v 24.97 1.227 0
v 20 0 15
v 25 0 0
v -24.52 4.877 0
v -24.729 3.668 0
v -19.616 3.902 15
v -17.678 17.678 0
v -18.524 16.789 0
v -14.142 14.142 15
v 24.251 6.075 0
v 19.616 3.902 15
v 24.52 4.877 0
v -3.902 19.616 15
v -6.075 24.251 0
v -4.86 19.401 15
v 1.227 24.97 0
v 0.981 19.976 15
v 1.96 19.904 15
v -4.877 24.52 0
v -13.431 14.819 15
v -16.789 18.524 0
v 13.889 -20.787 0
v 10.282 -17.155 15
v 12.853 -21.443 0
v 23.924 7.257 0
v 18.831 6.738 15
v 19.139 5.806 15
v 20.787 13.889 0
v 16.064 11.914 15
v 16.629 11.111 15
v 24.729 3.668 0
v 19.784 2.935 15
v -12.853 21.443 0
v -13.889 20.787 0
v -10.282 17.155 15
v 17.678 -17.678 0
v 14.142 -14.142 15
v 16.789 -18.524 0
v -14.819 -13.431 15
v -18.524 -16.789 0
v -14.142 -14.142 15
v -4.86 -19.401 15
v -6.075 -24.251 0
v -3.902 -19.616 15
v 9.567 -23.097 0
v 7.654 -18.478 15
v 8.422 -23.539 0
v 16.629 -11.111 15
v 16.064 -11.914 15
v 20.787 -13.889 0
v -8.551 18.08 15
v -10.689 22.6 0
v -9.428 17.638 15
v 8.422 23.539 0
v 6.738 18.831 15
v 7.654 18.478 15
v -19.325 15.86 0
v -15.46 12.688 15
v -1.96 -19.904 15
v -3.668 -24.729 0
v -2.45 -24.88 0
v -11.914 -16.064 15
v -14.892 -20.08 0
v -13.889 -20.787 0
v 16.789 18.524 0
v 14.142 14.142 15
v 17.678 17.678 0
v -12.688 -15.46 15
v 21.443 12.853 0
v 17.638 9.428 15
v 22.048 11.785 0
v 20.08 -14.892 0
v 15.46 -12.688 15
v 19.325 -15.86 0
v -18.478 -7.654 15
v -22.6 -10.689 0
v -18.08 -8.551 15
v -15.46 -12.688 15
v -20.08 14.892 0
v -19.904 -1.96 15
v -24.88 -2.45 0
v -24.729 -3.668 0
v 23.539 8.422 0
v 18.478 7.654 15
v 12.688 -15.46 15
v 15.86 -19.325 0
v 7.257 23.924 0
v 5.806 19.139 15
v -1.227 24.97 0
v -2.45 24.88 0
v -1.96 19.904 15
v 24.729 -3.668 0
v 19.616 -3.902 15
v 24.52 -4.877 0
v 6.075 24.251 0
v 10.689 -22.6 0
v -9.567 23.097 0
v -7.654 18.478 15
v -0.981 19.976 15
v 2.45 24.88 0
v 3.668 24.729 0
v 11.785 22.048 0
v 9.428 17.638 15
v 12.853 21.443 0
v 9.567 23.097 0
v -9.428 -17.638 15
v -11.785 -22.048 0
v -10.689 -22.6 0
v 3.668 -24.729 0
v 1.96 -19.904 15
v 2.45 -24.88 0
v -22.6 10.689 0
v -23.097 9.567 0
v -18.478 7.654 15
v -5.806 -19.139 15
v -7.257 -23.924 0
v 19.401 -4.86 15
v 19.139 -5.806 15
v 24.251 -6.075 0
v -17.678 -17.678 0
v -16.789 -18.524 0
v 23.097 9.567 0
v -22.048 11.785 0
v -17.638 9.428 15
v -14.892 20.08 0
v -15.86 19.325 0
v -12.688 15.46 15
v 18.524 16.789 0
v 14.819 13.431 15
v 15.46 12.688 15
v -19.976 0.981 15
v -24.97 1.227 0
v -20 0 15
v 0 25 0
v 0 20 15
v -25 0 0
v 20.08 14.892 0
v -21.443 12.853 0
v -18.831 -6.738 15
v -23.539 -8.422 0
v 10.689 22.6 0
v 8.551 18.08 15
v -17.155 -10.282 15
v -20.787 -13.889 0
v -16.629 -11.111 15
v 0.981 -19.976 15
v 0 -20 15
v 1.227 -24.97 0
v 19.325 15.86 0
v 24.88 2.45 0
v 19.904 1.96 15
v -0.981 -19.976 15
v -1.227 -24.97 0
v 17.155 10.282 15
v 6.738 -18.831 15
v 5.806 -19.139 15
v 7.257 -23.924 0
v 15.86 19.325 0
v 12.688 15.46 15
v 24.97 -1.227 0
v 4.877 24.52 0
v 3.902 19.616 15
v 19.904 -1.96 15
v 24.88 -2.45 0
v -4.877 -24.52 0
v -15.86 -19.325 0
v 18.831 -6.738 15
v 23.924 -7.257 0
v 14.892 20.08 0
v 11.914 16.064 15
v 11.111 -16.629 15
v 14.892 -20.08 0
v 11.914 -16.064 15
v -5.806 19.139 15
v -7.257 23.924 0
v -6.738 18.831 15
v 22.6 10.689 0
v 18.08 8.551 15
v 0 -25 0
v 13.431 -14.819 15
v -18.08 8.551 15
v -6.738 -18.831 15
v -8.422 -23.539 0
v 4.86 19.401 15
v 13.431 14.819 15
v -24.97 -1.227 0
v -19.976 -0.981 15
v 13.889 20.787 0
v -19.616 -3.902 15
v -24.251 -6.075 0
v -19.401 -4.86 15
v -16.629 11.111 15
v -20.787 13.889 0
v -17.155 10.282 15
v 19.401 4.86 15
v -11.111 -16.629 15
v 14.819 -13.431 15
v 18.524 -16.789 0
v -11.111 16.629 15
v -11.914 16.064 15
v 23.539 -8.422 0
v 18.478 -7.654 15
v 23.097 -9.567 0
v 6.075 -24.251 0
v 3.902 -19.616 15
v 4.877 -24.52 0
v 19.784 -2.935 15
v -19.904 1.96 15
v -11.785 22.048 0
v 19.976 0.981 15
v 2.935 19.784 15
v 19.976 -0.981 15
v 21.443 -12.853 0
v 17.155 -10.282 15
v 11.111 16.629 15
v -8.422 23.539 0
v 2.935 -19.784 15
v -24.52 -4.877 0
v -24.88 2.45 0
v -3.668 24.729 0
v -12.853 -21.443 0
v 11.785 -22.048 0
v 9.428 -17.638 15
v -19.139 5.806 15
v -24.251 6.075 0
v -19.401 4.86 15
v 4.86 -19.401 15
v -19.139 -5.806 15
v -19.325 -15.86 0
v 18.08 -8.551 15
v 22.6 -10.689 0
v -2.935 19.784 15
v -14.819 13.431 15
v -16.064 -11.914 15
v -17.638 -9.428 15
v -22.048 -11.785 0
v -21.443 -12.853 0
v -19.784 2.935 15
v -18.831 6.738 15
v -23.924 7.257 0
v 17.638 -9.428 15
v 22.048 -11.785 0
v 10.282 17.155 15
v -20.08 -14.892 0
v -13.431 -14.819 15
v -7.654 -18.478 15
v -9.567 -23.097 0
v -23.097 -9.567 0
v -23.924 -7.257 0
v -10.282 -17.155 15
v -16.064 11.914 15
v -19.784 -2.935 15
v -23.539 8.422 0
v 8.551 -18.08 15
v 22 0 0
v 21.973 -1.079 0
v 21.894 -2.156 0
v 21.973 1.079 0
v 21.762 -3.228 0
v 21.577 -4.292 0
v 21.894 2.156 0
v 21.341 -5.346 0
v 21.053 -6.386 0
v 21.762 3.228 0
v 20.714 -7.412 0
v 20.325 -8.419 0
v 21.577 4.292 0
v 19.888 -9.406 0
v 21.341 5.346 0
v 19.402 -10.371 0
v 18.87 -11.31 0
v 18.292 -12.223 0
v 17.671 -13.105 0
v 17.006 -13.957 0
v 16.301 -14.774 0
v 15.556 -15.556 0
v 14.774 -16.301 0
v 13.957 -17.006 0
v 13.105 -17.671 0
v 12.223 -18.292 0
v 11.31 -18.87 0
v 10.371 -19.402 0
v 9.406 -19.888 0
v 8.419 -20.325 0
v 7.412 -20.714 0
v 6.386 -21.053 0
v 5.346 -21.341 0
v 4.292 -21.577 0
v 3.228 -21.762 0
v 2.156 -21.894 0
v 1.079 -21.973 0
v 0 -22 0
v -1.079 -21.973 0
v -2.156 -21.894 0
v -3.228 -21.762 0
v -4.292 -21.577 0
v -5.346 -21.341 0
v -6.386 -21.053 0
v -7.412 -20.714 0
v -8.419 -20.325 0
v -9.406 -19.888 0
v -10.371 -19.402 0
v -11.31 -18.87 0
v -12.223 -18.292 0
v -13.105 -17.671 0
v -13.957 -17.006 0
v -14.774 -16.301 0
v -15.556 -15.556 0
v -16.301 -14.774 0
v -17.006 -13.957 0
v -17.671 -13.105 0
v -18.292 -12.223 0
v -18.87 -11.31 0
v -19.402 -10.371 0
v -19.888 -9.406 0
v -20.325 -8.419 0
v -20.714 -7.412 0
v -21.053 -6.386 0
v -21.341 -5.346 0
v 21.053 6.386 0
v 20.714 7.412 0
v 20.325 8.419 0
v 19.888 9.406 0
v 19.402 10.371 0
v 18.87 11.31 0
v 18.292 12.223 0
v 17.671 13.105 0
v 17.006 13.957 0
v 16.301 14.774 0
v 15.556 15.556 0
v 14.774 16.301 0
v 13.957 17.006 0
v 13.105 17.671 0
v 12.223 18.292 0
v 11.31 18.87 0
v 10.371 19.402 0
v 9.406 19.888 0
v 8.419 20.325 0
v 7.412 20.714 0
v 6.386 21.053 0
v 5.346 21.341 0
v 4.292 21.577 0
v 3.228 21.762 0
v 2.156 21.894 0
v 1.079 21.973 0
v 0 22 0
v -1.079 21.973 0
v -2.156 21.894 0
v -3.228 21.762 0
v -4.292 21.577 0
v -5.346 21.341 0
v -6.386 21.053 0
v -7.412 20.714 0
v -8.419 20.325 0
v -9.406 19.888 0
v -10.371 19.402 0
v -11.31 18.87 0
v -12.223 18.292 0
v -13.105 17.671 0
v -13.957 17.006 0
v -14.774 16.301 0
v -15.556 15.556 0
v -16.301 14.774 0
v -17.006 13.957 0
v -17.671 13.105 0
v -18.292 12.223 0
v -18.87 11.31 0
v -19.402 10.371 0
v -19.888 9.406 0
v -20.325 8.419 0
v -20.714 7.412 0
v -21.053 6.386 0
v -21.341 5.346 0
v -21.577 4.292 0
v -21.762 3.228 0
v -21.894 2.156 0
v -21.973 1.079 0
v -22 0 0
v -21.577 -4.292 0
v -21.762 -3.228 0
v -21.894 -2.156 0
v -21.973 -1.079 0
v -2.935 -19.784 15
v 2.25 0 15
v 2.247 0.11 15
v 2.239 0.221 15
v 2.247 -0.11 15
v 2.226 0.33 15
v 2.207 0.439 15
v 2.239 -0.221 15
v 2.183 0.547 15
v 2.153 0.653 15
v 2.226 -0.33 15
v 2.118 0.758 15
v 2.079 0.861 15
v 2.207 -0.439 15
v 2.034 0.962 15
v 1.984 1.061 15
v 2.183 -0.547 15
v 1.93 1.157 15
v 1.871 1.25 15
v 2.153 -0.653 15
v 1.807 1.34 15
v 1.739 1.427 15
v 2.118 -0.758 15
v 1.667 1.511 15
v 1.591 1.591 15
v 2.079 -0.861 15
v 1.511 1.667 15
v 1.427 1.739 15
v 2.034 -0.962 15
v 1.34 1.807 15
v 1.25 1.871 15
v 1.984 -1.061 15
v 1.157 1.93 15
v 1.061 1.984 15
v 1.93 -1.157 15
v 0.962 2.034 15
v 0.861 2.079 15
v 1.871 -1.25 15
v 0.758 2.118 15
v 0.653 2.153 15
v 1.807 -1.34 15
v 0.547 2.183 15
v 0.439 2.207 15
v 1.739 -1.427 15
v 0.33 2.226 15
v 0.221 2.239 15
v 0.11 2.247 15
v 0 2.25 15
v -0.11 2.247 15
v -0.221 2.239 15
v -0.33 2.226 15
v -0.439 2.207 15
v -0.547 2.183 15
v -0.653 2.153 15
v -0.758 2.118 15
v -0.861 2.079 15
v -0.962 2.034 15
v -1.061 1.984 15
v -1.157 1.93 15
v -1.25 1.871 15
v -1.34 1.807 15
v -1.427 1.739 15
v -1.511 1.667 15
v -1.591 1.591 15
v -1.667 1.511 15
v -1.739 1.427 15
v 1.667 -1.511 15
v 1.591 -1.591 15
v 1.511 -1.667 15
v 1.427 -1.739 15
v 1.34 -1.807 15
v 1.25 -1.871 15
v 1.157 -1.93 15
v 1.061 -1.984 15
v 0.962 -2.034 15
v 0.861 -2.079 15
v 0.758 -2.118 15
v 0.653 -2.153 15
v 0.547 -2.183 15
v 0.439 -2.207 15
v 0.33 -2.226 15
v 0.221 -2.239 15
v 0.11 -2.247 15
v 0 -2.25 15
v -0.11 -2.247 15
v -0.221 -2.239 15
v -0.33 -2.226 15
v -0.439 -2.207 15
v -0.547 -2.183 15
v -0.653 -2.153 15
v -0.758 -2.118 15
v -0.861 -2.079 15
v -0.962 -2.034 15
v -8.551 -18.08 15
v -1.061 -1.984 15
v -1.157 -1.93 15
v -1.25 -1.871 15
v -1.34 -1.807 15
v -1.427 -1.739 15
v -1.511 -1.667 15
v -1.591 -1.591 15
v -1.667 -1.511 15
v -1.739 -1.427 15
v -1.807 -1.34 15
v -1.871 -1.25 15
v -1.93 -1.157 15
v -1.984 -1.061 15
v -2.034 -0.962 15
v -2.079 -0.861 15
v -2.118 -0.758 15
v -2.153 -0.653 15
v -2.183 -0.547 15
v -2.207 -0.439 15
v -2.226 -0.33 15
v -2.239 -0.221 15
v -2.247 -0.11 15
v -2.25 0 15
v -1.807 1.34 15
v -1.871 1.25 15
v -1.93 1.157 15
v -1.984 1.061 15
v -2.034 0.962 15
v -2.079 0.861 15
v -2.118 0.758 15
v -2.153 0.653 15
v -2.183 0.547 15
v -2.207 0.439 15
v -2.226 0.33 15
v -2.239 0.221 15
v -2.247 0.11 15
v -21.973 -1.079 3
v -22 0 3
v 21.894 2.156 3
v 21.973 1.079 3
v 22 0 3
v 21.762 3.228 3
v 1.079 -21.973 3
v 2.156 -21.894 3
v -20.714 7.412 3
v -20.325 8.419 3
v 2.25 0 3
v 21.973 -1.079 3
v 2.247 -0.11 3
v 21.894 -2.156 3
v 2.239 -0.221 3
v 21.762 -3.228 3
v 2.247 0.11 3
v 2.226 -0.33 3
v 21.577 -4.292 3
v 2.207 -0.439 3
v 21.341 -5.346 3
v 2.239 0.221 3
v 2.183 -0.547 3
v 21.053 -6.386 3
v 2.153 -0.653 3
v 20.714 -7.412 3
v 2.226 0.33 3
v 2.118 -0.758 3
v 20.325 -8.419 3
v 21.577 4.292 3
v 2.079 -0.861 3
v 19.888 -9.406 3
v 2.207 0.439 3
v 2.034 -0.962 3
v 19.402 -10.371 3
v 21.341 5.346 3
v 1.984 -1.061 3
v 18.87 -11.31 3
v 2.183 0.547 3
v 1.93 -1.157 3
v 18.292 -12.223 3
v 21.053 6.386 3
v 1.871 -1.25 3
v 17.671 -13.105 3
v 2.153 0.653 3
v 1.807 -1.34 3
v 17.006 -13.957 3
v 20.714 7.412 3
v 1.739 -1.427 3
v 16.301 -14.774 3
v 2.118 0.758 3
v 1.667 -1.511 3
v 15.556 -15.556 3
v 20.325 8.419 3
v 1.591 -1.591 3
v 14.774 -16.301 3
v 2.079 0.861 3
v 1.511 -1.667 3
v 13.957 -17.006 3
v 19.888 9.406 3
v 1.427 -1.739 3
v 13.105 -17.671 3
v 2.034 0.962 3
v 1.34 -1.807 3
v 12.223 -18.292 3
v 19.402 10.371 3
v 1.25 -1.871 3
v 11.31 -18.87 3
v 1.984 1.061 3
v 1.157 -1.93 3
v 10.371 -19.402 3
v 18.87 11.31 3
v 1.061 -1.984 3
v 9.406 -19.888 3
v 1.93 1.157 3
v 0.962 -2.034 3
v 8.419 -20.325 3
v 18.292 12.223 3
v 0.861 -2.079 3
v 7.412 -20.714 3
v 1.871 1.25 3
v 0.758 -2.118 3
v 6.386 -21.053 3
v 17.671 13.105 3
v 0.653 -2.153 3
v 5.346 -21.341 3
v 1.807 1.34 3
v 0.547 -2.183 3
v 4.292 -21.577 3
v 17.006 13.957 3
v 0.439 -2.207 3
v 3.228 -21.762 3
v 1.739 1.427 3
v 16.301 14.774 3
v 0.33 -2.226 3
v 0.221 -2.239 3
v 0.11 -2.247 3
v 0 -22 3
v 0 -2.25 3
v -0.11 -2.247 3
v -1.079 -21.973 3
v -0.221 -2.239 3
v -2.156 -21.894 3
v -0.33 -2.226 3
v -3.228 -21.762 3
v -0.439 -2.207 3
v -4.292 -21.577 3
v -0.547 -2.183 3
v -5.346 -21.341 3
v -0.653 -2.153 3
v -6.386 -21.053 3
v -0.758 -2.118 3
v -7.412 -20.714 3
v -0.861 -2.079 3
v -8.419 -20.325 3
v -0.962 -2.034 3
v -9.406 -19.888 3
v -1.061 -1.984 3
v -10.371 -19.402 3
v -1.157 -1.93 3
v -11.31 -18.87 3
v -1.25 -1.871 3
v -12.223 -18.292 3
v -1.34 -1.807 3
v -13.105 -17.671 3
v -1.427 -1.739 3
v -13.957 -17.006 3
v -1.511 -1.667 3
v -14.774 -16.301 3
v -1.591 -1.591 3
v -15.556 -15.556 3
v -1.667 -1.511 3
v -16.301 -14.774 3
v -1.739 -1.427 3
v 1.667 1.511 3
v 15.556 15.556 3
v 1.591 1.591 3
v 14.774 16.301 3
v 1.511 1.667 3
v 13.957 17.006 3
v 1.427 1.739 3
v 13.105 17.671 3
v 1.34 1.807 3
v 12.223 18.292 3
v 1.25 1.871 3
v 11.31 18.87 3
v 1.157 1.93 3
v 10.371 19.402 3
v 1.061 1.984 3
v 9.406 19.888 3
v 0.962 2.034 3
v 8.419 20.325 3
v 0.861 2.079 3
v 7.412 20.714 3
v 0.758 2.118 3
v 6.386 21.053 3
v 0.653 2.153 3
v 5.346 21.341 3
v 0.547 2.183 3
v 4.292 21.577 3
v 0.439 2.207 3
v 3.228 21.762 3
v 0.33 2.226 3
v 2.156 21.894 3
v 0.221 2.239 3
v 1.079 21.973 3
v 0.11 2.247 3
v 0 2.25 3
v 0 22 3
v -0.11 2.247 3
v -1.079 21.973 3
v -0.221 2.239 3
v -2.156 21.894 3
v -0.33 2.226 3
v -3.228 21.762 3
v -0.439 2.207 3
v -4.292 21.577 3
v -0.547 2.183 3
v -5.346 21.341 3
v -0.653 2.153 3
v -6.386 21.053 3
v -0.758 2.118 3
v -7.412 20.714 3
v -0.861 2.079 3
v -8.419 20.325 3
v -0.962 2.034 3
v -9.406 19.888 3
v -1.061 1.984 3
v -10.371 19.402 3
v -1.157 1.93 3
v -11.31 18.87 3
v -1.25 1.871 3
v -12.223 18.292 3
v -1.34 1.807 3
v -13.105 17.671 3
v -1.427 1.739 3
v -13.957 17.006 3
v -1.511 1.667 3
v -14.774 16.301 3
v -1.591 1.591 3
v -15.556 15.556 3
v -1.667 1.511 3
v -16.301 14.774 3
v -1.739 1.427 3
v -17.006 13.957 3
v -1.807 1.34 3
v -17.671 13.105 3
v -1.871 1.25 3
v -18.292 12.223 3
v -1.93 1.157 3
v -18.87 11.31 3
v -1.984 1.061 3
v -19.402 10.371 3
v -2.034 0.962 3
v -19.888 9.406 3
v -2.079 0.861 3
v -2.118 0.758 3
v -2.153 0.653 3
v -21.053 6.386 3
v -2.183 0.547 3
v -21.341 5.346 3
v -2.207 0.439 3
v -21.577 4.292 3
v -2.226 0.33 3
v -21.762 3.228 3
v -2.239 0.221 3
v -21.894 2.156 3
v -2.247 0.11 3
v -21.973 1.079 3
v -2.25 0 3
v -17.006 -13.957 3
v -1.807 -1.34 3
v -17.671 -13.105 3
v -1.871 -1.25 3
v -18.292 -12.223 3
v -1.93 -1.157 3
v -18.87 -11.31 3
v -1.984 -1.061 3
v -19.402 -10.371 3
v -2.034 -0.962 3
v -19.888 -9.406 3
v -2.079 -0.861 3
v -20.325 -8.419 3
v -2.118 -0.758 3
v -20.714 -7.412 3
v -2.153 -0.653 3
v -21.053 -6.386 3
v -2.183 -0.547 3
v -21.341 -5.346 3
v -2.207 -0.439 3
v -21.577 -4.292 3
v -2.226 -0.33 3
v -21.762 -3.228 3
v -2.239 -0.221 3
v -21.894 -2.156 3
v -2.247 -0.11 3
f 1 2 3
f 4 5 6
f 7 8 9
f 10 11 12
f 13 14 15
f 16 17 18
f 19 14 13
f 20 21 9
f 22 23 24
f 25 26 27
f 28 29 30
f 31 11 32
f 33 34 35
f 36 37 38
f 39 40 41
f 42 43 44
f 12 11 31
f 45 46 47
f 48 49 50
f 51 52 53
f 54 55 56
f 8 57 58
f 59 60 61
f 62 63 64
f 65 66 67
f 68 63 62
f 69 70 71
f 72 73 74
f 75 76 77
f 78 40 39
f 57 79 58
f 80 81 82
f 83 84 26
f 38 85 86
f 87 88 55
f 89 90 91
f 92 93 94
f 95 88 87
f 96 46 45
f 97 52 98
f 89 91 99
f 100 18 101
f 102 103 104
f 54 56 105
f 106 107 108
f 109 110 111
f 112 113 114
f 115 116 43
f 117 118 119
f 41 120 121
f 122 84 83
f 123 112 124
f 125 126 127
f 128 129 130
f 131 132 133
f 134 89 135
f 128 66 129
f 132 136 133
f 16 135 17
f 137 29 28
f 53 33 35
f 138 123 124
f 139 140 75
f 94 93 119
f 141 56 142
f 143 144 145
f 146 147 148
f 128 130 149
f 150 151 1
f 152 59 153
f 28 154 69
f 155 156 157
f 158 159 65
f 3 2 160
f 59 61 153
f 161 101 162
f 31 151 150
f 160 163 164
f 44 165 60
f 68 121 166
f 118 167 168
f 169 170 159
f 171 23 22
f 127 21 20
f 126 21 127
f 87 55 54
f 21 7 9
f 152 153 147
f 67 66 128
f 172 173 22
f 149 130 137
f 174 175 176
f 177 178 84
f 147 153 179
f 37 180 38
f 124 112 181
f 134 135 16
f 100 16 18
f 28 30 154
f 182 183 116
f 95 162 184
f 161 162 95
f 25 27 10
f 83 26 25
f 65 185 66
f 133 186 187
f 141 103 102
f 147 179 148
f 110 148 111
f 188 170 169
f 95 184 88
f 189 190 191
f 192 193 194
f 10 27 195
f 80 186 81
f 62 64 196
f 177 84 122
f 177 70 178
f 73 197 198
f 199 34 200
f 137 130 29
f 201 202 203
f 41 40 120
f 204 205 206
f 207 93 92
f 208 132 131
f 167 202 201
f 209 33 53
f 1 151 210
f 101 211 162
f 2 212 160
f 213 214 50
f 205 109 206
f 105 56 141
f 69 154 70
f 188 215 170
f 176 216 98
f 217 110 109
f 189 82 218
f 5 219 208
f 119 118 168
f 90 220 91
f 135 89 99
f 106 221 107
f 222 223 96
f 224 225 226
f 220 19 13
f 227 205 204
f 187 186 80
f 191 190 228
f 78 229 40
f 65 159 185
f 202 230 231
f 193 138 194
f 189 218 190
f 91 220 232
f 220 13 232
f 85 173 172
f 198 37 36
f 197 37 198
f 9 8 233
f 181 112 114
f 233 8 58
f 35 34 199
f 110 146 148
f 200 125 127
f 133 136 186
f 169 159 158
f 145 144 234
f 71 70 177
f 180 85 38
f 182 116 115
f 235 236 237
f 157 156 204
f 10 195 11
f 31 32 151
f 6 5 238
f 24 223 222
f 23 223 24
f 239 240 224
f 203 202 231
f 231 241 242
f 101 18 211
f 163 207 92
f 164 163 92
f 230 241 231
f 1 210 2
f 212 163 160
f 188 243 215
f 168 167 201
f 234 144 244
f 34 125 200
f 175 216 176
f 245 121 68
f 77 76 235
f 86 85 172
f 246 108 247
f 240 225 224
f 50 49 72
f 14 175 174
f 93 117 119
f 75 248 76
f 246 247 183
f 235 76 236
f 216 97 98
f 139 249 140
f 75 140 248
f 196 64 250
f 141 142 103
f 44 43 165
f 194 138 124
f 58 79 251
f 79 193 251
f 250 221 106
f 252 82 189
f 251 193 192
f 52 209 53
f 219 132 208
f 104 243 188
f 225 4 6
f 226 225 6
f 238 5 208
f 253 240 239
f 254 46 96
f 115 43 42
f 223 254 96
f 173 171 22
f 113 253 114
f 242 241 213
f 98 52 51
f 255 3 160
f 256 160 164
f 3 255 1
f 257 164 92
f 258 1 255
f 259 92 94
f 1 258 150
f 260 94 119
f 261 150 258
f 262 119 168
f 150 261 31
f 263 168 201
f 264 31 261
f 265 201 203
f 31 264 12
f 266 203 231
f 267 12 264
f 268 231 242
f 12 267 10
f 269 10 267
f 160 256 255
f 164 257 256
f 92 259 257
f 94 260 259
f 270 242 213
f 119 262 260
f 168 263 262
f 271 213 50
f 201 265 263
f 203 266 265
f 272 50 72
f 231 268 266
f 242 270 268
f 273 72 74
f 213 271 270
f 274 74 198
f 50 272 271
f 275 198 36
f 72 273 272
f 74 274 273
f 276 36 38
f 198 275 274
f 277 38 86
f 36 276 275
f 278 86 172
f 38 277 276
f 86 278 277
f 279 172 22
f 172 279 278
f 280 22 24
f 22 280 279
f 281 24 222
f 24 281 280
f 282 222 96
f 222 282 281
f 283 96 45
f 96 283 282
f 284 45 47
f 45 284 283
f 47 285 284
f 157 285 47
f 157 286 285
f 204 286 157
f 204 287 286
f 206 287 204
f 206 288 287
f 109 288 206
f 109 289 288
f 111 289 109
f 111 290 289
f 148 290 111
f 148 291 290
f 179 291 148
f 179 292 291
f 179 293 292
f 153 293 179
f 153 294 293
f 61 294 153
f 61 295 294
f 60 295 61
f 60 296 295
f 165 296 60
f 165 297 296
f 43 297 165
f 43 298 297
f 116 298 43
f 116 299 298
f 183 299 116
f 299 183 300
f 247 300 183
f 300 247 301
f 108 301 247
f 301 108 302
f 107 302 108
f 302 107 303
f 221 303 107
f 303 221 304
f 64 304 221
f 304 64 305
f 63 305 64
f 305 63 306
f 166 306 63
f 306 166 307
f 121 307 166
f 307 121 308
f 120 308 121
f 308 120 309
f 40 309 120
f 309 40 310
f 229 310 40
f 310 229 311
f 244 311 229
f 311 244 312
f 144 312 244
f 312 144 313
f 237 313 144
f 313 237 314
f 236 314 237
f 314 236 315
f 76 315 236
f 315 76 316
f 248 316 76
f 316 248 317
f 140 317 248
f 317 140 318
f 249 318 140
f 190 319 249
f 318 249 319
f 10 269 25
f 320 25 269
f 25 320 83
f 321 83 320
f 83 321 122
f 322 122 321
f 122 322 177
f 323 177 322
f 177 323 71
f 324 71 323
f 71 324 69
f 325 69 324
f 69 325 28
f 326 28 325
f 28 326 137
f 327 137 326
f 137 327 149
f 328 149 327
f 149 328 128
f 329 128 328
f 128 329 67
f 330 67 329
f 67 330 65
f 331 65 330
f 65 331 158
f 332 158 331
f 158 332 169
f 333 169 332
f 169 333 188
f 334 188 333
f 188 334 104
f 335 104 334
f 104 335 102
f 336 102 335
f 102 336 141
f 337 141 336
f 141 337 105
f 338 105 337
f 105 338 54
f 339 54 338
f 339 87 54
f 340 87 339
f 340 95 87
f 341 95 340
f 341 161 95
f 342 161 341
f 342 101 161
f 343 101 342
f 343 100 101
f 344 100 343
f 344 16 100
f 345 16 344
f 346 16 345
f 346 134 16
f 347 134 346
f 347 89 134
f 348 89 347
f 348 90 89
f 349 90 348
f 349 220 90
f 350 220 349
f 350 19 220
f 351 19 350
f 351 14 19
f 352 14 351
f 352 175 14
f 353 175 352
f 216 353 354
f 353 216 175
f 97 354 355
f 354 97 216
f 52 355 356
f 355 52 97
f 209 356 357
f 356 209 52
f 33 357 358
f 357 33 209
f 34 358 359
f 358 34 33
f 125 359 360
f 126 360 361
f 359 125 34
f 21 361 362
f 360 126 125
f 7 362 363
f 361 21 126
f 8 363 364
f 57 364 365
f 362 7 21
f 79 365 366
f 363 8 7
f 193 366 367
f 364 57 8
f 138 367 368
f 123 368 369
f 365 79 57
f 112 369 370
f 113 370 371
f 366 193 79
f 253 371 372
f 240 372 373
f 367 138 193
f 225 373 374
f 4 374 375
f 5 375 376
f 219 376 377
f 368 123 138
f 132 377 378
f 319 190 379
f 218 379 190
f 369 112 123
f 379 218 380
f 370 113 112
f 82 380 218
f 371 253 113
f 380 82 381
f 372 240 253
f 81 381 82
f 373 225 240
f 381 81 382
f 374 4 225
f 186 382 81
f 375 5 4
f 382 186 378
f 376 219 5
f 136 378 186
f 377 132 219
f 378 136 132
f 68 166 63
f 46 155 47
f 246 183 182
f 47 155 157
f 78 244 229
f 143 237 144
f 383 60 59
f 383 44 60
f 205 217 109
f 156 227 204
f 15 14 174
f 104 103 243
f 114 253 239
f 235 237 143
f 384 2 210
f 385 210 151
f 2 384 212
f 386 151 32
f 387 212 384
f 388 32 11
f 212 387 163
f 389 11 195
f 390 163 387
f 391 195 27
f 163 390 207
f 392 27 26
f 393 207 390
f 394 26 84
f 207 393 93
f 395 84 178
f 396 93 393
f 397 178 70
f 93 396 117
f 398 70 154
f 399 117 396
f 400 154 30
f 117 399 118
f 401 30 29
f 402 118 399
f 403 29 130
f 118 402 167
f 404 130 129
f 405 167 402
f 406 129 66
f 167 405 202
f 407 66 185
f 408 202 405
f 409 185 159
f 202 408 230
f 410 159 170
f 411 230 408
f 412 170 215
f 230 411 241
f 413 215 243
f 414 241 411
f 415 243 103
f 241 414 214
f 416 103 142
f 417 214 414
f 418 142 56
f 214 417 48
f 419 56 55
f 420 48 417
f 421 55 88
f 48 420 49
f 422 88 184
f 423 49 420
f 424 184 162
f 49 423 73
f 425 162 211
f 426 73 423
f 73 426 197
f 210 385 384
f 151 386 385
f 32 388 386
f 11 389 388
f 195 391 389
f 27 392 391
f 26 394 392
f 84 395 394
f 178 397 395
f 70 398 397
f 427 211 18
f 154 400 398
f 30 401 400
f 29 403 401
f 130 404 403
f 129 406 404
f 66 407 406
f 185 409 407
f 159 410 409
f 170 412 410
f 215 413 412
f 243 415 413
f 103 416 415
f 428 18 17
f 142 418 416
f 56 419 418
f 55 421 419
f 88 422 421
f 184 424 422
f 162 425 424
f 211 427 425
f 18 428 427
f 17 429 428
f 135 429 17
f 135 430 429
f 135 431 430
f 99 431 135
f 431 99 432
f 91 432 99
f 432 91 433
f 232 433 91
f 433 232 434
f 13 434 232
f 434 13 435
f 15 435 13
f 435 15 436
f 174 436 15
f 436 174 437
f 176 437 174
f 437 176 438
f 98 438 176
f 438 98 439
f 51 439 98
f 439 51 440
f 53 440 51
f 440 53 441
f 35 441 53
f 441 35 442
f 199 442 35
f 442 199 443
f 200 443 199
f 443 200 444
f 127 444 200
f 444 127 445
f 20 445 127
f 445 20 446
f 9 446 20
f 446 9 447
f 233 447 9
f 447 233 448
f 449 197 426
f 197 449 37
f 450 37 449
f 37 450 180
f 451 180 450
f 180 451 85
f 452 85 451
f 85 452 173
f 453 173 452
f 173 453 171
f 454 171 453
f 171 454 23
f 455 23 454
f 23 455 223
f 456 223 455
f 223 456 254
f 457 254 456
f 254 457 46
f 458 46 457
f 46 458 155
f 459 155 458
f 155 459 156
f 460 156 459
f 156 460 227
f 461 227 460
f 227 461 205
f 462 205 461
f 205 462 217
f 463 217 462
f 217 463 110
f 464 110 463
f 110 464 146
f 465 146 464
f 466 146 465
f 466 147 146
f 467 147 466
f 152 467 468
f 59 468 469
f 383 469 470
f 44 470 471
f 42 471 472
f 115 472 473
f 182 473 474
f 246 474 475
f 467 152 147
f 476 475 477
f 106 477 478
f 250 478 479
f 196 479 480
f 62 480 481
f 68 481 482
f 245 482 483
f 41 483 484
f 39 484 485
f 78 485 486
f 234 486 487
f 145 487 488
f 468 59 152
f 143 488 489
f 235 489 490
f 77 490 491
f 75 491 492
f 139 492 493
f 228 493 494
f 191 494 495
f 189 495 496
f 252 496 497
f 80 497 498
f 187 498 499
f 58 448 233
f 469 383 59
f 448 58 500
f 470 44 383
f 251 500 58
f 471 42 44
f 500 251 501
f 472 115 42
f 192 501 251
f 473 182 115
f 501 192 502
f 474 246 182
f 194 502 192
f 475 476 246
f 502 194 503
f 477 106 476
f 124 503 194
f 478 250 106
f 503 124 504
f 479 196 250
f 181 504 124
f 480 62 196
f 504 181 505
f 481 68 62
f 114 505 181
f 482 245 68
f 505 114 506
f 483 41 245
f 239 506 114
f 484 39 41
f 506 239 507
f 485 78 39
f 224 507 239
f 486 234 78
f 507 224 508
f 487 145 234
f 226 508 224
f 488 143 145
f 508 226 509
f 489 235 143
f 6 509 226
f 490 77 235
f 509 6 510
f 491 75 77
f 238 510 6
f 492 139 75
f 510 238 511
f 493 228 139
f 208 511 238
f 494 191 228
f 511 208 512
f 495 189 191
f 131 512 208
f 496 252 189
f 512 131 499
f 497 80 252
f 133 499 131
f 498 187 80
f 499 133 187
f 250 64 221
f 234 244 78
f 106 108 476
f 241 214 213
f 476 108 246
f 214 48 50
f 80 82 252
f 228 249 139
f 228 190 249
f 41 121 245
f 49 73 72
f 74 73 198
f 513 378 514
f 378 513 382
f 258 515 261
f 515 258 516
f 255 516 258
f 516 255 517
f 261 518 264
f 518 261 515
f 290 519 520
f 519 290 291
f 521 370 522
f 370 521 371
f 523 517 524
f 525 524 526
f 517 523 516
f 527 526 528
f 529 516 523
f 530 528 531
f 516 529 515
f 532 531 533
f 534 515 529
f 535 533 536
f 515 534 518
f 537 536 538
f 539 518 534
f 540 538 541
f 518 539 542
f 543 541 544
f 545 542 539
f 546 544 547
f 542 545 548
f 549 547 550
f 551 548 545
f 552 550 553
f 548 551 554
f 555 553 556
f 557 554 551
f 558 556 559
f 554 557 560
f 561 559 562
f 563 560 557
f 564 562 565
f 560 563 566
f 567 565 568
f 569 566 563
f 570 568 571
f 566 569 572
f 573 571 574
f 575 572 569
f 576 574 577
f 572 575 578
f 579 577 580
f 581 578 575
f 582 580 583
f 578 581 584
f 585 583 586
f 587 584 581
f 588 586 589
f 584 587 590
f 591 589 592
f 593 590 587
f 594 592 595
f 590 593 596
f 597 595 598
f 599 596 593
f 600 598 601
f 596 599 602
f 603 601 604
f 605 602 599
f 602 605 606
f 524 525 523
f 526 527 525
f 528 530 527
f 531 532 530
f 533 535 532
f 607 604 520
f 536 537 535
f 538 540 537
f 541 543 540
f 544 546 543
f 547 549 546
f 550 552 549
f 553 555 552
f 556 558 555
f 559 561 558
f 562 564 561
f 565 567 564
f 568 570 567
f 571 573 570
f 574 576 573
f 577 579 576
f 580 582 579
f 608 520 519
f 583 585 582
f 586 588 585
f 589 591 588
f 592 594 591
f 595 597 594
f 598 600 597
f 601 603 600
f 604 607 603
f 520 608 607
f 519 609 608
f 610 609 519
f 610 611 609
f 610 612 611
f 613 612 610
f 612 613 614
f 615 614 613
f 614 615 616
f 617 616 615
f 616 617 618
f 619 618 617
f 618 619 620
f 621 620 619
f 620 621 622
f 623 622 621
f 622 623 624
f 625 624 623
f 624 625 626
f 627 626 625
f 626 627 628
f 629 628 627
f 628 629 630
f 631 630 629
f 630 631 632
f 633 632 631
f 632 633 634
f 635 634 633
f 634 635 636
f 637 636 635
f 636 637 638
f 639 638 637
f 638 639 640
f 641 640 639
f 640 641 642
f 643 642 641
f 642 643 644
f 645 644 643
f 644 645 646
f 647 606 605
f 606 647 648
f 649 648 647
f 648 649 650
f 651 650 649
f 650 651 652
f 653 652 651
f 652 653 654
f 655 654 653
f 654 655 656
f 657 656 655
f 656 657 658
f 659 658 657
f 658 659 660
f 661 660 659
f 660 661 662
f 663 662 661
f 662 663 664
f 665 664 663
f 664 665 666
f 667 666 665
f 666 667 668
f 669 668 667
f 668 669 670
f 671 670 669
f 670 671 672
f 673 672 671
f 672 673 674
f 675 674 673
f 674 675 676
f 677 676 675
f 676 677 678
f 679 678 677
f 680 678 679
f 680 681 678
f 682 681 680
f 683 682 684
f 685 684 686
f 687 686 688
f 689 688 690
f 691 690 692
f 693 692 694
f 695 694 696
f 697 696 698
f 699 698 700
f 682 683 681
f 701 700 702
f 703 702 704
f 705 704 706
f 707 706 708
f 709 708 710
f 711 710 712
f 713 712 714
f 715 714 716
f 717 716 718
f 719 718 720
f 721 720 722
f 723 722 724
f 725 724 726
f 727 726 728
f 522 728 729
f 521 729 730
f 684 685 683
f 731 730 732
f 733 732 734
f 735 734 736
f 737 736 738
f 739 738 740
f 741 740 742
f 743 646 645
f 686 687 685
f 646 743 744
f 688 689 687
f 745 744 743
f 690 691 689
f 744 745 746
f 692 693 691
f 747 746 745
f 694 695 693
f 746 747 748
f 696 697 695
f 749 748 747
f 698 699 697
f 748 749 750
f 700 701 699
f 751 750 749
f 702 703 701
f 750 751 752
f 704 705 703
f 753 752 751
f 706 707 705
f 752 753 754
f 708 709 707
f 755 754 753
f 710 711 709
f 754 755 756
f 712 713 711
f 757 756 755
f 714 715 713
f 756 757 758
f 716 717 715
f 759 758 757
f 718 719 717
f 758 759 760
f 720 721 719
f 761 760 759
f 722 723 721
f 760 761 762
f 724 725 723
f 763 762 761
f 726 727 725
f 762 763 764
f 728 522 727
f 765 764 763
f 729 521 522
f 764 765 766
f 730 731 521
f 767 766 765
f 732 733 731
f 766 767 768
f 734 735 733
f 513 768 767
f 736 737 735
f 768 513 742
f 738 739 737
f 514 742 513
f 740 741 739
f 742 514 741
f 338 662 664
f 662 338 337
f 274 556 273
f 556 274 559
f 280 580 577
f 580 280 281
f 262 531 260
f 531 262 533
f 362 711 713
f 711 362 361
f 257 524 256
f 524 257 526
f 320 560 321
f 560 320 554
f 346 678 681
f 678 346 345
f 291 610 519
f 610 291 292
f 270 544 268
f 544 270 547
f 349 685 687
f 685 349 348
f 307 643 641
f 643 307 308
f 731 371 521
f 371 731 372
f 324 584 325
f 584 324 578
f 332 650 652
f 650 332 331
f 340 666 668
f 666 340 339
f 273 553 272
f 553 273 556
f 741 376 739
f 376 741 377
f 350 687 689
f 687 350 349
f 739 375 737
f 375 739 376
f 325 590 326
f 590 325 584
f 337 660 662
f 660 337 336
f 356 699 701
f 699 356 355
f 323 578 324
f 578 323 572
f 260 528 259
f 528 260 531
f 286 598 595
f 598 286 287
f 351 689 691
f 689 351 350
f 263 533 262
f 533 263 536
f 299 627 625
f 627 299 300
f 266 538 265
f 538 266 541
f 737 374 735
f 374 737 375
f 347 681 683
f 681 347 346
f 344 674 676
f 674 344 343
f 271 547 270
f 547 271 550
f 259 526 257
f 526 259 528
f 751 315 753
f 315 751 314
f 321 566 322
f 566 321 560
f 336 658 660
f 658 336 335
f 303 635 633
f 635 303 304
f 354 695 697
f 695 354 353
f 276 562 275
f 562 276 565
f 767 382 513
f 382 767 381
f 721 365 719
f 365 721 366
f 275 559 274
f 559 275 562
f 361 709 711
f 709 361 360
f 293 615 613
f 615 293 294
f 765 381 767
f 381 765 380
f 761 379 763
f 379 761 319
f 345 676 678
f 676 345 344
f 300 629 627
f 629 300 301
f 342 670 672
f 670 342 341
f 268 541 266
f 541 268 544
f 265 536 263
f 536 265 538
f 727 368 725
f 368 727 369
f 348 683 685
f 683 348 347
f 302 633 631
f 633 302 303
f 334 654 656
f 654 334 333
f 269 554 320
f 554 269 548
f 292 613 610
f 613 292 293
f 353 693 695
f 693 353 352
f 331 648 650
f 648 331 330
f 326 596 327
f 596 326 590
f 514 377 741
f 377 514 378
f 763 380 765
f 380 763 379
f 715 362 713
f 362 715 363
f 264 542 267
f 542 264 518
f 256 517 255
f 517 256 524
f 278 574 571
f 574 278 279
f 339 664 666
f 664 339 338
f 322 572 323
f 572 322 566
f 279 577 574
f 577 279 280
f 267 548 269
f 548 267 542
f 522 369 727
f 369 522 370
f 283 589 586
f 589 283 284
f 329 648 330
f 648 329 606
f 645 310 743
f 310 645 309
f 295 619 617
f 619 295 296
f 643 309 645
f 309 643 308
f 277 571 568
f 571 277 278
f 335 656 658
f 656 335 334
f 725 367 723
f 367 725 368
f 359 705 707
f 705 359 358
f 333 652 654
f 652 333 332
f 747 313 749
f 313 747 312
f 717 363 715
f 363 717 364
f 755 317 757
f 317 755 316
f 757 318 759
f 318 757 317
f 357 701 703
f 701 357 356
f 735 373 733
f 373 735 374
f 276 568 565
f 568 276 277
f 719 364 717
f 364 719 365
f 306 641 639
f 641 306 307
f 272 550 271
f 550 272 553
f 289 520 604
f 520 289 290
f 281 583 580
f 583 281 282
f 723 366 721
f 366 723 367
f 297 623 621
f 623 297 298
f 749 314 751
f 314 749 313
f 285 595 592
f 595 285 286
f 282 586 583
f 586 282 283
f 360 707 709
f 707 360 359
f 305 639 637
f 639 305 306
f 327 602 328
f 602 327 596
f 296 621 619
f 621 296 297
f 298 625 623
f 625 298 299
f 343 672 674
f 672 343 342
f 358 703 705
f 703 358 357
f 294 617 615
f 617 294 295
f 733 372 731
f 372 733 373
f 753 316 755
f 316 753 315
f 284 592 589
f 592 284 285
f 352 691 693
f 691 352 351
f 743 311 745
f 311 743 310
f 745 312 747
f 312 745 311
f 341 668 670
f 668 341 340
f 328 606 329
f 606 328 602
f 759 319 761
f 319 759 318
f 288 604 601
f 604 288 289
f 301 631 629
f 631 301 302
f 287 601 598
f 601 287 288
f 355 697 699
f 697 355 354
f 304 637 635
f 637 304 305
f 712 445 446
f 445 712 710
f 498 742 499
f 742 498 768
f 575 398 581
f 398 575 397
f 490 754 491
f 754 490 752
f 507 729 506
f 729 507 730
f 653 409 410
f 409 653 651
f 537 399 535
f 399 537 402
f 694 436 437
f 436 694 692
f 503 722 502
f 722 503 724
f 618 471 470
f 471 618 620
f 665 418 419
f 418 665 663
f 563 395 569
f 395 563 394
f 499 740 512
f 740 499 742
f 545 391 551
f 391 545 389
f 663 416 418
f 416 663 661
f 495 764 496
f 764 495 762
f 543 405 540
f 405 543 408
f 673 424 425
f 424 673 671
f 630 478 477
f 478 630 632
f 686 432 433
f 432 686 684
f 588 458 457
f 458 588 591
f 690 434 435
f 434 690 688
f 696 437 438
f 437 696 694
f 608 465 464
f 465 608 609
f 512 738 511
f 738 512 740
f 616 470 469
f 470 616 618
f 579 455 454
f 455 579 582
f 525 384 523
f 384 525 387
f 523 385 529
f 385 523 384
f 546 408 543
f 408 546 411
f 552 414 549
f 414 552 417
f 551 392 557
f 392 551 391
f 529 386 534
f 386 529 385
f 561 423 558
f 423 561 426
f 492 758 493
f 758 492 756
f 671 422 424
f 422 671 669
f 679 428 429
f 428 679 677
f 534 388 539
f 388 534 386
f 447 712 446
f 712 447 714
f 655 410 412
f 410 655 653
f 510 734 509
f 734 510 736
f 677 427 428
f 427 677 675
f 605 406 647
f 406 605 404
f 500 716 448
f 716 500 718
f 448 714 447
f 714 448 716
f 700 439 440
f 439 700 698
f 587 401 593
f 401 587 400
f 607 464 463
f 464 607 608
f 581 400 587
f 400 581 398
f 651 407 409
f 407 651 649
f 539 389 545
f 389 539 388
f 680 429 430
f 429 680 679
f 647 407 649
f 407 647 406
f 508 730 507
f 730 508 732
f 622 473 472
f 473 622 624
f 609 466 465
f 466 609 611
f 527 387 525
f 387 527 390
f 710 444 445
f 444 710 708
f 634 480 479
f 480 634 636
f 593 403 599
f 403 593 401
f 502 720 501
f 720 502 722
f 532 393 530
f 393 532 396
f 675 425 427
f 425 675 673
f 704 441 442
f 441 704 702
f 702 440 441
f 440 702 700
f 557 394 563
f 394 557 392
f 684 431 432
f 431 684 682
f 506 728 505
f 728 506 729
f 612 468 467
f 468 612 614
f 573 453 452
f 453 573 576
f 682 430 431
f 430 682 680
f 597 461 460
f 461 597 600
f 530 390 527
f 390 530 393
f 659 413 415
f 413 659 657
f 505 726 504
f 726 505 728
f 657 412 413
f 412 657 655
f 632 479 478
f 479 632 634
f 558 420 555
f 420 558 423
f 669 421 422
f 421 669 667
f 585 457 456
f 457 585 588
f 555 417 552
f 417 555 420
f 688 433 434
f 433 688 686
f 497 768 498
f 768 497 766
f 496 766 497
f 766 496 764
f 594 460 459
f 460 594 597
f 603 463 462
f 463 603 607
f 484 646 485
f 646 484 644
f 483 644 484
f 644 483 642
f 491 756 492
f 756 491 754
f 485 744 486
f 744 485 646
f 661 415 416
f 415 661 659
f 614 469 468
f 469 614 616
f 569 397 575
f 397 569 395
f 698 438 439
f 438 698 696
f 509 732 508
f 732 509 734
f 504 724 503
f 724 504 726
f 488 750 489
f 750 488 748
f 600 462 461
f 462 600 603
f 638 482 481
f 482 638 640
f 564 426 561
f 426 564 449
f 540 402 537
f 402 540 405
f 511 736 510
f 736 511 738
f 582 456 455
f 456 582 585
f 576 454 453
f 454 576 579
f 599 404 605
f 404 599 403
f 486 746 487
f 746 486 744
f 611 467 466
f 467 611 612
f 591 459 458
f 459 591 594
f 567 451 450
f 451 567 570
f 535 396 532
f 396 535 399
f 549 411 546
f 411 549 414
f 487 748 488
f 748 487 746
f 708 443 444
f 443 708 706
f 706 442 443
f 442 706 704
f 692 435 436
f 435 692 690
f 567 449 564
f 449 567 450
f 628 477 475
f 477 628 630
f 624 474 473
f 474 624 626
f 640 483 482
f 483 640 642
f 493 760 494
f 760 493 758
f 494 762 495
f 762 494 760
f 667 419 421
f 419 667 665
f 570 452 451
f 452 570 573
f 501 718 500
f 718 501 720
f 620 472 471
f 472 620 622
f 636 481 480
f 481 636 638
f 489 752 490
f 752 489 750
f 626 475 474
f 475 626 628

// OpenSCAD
// Anti-vibration foot for benchtop instrument
// Print orientation: bottom face (with pad recess) on the bed, z = 0

$fn = 128;

// --- Dimensions (mm) ---
base_d       = 50;    // frustum diameter at bottom (z = 0)
top_d        = 40;    // frustum diameter at flat top
foot_h       = 15;    // overall height of the foot
recess_d     = 44;    // rubber pad recess diameter (bottom face)
recess_depth = 3;     // rubber pad recess depth
screw_d      = 4.5;   // central through-hole diameter for screw
eps          = 0.5;   // overshoot for clean boolean cuts

difference() {
    // Frustum body
    cylinder(h = foot_h, d1 = base_d, d2 = top_d);

    // Rubber pad recess in bottom face
    translate([0, 0, -eps])
        cylinder(h = recess_depth + eps, d = recess_d);

    // Central screw hole, through all
    translate([0, 0, -eps])
        cylinder(h = foot_h + 2 * eps, d = screw_d);
}
